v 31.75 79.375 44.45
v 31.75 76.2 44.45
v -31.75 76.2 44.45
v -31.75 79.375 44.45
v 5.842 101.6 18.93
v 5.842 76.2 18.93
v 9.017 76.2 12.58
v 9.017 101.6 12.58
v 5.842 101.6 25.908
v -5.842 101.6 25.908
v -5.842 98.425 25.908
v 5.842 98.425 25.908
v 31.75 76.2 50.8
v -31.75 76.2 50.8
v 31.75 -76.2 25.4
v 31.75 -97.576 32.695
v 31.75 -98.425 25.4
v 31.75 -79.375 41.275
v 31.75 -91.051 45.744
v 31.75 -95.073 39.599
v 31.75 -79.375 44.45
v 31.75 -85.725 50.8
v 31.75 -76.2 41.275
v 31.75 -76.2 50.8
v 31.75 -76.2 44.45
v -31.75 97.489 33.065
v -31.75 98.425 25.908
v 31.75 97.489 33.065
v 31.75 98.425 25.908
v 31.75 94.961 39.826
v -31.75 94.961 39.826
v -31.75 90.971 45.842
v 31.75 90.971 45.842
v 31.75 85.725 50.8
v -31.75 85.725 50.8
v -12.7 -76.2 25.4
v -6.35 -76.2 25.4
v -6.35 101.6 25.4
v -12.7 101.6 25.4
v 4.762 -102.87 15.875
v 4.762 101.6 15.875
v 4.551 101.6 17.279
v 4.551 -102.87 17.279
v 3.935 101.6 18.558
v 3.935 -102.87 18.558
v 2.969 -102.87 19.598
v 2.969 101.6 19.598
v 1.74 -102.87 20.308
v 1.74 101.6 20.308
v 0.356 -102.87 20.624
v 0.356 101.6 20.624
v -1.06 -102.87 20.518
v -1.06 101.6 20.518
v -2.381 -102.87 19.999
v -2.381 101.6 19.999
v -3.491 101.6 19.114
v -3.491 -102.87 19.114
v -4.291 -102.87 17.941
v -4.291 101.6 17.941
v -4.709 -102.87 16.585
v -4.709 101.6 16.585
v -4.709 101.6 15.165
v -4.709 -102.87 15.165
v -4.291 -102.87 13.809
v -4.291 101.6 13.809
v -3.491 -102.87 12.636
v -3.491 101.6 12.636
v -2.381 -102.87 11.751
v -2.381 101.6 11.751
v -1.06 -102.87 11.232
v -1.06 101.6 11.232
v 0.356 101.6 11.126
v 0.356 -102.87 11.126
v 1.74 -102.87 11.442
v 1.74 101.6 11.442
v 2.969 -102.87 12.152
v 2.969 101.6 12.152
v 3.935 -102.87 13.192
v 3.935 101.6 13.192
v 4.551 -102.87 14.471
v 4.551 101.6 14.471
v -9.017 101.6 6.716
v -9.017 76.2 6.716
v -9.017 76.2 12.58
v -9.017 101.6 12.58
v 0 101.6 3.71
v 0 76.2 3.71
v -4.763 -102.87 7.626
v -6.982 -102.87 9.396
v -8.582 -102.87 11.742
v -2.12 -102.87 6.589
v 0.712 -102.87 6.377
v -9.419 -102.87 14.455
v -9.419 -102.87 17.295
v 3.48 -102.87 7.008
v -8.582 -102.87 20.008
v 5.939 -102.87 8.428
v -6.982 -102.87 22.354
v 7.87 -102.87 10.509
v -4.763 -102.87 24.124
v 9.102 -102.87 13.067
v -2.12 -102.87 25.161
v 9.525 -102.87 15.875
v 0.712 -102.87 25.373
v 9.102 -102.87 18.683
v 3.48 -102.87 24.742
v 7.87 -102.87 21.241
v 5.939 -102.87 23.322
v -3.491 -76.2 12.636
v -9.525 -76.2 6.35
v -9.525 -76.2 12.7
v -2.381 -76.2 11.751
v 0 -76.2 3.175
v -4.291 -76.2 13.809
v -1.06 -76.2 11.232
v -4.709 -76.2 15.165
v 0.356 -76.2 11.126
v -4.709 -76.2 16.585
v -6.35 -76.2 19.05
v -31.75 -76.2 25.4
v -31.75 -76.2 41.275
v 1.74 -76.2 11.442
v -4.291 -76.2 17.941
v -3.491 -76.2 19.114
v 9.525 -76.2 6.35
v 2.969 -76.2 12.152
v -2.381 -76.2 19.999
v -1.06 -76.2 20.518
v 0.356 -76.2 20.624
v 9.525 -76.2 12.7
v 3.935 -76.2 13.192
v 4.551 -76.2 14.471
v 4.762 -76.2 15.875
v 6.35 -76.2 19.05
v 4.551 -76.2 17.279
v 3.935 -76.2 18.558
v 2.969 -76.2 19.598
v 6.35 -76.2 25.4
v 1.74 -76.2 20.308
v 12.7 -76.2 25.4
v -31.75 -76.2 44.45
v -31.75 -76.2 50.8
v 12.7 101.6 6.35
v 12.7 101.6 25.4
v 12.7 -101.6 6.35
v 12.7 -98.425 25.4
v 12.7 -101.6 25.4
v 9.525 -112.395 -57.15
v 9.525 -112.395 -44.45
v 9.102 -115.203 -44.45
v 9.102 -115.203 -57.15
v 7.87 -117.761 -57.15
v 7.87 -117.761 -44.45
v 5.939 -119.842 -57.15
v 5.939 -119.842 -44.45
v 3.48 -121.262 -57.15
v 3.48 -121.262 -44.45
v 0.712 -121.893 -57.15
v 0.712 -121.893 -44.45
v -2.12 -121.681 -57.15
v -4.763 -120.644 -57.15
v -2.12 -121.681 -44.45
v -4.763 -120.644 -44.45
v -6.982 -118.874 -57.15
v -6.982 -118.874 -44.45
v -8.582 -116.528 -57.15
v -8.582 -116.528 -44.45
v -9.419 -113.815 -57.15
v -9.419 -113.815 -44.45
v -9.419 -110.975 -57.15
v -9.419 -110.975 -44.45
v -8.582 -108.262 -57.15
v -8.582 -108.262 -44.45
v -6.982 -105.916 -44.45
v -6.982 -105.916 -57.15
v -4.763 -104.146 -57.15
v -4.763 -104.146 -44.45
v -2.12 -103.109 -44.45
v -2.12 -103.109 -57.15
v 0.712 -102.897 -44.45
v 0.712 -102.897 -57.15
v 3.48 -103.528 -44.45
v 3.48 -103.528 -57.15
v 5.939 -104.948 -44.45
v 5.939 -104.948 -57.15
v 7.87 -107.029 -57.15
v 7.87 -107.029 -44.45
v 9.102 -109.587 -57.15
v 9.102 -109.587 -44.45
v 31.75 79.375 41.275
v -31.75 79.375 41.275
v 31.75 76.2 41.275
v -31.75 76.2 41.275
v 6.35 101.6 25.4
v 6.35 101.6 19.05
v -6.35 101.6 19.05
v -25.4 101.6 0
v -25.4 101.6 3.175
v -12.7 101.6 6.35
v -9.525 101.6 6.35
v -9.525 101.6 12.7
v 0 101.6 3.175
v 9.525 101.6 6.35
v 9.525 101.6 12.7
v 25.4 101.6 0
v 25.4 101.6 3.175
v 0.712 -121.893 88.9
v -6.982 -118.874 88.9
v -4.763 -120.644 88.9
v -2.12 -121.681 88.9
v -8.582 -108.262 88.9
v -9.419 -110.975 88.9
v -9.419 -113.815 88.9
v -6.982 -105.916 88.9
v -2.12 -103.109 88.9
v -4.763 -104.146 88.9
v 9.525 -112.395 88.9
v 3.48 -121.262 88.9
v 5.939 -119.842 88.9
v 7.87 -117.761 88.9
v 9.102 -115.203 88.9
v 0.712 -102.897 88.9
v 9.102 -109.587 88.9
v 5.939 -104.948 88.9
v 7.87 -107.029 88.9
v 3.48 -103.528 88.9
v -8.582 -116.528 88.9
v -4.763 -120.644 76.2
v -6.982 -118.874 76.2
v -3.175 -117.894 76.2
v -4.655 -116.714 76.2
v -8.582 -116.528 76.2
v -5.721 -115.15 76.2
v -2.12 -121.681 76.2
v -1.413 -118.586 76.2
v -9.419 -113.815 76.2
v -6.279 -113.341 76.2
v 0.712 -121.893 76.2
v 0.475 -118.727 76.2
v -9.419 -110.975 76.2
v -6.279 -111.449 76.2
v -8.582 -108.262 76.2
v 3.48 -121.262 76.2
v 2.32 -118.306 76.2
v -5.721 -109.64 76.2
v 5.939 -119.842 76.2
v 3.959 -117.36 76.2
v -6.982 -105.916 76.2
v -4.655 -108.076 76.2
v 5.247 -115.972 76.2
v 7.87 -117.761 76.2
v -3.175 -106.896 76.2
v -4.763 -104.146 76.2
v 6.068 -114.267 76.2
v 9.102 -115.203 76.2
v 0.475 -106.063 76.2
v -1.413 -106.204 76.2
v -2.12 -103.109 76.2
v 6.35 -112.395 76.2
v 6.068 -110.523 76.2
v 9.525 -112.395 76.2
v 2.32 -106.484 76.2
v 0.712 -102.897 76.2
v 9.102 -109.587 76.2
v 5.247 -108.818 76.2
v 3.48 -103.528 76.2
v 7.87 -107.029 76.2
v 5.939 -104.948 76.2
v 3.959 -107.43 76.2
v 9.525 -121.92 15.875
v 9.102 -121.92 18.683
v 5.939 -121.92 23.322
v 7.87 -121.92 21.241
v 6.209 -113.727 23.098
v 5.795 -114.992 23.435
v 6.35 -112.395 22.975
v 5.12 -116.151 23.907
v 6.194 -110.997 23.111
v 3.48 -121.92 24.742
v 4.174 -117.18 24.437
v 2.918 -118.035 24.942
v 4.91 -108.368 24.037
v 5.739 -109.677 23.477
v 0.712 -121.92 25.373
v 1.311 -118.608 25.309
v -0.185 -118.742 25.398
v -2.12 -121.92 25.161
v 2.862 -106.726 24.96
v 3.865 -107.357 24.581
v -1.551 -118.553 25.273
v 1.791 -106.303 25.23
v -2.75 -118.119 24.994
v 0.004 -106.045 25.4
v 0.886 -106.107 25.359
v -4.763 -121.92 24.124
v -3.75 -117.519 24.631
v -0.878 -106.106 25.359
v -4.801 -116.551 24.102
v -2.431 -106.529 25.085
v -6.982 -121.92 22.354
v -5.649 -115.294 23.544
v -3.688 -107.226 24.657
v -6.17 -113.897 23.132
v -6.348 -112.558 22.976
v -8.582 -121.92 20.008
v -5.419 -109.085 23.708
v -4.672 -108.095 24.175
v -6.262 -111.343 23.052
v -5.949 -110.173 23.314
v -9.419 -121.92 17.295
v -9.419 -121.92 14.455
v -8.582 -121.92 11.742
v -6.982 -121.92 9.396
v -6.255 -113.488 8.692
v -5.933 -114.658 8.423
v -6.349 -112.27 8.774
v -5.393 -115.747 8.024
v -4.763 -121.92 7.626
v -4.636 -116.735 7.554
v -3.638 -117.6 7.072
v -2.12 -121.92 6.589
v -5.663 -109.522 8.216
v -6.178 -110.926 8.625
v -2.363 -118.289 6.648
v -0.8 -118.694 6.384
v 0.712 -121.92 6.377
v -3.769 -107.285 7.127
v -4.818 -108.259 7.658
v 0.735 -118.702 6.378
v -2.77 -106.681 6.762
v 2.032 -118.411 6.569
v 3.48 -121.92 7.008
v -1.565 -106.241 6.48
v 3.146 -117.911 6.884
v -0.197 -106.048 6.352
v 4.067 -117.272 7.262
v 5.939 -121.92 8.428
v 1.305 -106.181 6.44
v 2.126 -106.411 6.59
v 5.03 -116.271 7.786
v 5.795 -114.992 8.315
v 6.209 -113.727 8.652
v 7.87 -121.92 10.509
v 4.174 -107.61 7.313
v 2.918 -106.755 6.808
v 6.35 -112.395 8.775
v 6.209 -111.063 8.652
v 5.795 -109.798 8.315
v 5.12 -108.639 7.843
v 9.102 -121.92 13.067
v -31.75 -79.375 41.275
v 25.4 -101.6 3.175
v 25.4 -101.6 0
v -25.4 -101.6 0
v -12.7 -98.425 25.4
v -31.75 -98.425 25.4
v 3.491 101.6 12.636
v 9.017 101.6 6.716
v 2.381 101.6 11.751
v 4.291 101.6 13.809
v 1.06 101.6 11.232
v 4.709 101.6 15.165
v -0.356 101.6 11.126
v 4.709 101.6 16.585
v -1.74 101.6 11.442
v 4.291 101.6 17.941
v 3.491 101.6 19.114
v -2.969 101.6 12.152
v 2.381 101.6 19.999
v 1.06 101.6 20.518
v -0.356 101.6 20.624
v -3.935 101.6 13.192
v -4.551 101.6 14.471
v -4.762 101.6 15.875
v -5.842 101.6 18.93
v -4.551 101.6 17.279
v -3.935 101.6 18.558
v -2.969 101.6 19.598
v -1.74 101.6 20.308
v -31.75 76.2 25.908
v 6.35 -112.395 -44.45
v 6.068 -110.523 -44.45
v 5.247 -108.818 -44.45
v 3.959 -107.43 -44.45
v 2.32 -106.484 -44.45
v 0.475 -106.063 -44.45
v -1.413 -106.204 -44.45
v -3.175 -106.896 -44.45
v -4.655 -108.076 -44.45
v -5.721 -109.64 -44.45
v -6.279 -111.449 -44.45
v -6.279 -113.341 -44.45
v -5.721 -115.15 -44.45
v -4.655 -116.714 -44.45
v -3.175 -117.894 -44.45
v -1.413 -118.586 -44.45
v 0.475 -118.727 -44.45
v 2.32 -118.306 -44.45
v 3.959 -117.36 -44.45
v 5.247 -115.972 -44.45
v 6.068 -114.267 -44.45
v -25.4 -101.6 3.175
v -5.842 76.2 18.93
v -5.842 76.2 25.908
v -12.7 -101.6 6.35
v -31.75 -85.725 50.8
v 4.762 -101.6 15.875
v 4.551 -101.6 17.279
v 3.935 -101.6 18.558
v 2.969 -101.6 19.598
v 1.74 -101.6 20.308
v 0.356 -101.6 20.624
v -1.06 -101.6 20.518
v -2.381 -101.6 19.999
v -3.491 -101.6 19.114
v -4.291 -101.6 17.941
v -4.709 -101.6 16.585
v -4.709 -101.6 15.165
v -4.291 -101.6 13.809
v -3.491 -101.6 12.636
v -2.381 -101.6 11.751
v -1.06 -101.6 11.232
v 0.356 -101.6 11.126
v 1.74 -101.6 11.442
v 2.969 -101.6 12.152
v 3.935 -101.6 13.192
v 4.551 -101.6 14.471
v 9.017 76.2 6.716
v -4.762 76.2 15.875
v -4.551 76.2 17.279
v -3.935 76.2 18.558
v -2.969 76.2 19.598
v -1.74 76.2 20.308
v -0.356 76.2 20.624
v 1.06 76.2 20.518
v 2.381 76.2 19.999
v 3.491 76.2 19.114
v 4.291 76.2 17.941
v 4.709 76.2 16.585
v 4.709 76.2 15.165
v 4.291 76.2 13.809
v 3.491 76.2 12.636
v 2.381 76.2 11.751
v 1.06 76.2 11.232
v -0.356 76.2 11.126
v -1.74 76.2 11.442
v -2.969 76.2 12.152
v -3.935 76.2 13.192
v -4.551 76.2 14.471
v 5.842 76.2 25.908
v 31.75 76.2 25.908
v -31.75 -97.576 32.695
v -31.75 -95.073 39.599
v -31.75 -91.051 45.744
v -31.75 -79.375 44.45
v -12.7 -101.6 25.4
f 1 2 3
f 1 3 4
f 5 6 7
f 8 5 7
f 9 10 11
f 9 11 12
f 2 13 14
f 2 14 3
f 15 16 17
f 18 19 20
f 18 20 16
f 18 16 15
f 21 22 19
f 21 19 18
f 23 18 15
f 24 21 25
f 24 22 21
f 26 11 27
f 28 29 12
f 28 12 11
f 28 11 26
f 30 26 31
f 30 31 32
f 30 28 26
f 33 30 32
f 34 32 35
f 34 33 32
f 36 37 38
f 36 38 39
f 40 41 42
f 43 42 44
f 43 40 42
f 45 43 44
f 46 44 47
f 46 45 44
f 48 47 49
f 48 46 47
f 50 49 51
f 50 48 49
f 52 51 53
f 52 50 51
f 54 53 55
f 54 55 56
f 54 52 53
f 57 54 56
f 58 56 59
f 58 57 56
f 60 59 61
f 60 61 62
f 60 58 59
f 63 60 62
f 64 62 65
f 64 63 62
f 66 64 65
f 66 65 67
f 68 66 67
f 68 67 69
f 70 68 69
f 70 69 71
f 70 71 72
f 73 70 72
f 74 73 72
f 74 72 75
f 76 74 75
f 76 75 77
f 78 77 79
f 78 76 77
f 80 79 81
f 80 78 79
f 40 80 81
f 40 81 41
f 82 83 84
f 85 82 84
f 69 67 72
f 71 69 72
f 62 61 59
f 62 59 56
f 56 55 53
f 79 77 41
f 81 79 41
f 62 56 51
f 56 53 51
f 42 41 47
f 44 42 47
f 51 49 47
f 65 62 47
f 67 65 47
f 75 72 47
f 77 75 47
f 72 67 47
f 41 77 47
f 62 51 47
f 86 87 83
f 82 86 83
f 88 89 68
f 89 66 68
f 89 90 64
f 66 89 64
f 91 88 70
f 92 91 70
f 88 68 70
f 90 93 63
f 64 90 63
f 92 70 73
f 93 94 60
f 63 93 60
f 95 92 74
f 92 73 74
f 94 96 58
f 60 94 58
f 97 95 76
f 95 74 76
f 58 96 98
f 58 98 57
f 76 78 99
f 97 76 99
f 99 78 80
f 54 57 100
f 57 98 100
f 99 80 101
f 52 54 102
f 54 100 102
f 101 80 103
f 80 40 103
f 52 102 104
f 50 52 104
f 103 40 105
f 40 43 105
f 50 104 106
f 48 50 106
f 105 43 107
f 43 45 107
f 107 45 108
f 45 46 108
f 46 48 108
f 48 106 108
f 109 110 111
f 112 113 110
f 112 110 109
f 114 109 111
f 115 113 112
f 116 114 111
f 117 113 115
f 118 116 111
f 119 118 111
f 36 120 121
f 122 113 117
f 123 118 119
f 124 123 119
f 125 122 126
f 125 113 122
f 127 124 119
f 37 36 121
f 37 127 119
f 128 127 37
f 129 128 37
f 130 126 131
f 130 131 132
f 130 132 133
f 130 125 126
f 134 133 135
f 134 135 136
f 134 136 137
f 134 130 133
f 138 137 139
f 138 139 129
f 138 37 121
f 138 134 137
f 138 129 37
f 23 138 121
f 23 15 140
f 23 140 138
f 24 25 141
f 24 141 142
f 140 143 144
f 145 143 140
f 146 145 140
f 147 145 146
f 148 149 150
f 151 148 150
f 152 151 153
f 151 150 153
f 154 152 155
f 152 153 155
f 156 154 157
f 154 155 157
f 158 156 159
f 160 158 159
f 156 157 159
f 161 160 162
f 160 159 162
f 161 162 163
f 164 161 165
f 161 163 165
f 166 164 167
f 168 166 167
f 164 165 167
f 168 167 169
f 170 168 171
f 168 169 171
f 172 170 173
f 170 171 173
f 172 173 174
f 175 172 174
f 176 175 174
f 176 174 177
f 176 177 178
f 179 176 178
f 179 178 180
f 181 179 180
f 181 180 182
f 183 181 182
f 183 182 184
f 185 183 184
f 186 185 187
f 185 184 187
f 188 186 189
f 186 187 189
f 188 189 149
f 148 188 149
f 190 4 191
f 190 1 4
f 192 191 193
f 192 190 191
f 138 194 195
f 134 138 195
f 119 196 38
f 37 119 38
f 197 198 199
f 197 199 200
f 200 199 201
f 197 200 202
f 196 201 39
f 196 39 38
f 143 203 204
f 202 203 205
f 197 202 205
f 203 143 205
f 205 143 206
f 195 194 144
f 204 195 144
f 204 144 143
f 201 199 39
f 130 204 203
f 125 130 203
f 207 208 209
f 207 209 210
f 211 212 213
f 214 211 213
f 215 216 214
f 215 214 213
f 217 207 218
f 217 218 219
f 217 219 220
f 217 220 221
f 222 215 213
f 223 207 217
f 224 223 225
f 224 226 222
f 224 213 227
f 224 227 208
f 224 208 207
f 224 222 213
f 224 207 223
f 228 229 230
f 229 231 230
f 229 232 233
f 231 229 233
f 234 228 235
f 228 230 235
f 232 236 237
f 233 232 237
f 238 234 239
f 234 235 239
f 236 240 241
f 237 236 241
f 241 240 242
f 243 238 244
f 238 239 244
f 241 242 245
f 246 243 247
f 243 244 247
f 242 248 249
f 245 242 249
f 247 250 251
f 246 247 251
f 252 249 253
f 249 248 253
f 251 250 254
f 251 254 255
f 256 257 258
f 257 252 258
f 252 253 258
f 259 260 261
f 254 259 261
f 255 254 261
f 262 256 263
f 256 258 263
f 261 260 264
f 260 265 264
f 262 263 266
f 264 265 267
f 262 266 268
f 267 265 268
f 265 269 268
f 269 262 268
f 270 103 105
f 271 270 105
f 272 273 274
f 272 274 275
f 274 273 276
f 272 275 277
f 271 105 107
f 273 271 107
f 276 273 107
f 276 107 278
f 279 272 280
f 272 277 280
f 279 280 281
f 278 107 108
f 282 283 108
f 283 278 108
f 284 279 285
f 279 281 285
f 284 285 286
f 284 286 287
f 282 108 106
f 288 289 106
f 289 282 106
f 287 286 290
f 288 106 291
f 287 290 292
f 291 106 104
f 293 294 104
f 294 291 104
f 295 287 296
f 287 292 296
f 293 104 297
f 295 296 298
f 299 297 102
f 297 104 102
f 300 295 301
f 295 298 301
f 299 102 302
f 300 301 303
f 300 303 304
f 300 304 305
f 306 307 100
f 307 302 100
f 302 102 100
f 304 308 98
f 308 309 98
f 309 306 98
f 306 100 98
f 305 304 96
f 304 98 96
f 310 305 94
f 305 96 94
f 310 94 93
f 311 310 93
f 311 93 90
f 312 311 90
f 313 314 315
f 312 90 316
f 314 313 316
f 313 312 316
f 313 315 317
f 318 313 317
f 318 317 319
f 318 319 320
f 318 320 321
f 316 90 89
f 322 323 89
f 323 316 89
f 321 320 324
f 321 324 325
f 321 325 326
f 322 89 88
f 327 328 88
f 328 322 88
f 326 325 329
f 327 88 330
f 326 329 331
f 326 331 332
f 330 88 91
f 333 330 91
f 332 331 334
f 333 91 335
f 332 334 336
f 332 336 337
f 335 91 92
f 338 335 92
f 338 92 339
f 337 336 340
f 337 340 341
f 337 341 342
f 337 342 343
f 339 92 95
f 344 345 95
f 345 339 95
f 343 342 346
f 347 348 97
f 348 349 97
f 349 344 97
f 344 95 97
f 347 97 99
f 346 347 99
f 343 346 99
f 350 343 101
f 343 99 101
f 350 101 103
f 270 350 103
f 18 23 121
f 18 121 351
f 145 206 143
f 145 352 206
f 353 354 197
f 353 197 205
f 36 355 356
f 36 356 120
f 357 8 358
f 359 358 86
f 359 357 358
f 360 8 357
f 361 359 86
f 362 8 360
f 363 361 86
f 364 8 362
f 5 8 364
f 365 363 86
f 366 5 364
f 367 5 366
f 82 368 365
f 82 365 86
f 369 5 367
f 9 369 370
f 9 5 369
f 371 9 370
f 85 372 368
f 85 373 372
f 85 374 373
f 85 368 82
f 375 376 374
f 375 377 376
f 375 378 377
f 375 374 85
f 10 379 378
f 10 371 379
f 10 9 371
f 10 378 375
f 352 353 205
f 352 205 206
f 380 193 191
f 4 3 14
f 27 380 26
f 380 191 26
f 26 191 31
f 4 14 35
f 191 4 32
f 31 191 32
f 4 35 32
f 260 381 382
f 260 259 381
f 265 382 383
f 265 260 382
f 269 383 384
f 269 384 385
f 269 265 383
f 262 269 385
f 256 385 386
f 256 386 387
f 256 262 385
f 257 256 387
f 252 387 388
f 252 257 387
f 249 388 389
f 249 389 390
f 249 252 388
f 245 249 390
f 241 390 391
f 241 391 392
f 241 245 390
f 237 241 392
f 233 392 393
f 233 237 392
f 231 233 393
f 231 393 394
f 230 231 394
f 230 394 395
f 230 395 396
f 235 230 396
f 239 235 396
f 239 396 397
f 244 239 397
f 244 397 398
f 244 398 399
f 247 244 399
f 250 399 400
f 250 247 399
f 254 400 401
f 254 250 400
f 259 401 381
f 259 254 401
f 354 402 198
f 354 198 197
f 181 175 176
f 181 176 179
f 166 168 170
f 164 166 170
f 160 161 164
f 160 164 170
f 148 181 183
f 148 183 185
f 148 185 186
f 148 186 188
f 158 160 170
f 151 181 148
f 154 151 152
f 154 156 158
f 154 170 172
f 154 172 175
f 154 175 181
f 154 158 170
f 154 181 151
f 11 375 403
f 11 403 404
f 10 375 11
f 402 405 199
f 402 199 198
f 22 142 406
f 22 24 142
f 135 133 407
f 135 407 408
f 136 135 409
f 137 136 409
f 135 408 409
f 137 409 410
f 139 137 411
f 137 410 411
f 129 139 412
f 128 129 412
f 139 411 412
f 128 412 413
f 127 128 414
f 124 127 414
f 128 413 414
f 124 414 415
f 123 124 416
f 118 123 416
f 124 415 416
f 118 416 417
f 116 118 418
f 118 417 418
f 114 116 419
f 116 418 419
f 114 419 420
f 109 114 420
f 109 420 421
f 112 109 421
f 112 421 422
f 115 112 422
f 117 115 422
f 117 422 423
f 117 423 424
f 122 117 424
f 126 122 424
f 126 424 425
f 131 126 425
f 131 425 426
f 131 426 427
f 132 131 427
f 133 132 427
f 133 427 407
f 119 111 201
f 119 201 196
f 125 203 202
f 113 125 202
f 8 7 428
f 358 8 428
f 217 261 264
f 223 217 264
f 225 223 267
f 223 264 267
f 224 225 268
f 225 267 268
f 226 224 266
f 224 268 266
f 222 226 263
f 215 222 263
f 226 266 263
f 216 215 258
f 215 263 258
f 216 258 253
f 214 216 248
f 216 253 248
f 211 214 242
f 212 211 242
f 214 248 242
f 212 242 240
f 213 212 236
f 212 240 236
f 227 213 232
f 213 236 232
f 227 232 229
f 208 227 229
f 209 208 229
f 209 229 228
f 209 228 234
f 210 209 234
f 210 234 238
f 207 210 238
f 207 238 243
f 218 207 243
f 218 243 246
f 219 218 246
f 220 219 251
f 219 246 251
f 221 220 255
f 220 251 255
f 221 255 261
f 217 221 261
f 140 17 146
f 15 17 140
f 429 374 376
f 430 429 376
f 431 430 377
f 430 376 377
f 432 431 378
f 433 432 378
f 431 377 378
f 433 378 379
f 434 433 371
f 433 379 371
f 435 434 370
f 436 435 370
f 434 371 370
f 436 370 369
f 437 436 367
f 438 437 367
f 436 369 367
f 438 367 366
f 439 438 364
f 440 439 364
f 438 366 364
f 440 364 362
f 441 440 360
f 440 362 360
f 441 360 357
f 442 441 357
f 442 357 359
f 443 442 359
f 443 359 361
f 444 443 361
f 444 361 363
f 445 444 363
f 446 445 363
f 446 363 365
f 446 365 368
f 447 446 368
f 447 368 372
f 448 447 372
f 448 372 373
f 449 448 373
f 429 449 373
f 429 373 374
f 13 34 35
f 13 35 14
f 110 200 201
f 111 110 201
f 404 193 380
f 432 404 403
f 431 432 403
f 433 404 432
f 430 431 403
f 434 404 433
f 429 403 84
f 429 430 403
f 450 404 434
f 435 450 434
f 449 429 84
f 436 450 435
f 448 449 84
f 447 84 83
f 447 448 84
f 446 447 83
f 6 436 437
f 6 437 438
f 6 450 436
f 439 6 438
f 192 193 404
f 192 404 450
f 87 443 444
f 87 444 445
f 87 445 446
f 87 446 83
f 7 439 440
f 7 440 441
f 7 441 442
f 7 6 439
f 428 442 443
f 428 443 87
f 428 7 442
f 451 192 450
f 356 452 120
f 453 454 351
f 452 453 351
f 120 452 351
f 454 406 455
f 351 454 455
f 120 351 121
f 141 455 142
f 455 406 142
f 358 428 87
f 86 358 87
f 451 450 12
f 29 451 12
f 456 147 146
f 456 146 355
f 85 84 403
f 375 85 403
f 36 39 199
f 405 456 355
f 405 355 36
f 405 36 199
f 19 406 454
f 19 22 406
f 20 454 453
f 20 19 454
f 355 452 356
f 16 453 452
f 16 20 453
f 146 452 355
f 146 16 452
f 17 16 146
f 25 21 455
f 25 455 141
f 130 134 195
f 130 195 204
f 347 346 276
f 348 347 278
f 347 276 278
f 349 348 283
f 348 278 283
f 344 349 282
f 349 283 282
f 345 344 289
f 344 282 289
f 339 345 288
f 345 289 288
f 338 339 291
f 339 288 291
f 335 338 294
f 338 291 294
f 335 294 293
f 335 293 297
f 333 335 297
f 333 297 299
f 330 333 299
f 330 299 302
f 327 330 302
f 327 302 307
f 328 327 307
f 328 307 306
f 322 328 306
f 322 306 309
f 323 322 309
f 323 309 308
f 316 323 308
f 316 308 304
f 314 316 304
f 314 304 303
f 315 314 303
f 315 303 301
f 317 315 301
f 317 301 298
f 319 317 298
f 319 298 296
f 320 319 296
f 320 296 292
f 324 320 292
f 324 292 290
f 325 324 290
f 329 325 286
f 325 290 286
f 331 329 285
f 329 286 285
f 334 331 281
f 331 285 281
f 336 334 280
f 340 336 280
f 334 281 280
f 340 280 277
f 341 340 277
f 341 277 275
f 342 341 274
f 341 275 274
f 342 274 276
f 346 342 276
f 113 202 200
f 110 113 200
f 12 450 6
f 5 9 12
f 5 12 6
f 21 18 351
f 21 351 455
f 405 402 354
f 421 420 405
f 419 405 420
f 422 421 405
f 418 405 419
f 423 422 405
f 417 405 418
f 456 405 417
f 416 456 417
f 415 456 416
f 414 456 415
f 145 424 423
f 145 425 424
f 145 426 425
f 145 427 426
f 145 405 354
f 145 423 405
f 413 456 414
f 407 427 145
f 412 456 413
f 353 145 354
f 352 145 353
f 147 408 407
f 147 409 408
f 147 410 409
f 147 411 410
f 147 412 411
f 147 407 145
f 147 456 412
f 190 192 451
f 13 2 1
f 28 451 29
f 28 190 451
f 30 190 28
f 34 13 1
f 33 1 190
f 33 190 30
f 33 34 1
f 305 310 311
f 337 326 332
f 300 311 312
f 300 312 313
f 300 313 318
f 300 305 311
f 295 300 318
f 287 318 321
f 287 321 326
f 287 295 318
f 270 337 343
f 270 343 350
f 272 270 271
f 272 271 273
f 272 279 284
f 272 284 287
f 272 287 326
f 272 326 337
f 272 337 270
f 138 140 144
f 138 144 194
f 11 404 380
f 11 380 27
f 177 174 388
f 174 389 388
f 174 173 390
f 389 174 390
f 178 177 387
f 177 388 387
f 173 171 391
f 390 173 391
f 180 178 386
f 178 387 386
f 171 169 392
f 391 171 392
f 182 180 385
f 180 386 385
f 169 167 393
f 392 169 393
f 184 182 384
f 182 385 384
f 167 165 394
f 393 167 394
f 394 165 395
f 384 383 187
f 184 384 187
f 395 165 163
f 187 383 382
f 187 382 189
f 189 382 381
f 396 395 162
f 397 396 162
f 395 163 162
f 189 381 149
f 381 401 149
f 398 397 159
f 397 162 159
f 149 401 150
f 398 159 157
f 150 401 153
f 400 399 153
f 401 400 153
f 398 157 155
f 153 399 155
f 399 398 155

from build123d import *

# Parameters (mm, degrees)
F1_DEPTH       = 101.6
F2_R           = 4.7625
F3_DEPTH       = 203.2
F4_R           = 4.7625
F5_DEPTH       = 177.8
F7_DEPTH       = 31.75
F9_DEPTH       = 25.4
F11_DEPTH      = 31.75
F12_R          = 4.7625
F13_DEPTH      = 203.201
F15_R          = 4.7625
F16_DEPTH      = 204.47
F17_R          = 9.525
F18_DEPTH      = 19.05
F19_R          = 6.35
F20_DEPTH      = 25.4
F21_DEPTH      = 50.8
F21_DEPTH_BACK = 69.85
F22_R          = 9.525
F22_R_2        = 6.35
F23_DEPTH      = 12.7
F24_R          = 9.525
F24_R_2        = 6.35
F25_DEPTH      = 12.7


with BuildPart() as f1:
    # F0 (on Front) → F1 (new body, symmetric)
    with BuildSketch(Plane.XZ):
        Polygon((12.7, 25.4), (-12.7, 25.4), (-12.7, 6.35), (-25.4, 3.175), (-25.4, 0), (-12.7, 0), (12.7, 0), (25.4, 0), (25.4, 3.175), (12.7, 6.35), align=None)
    extrude(amount=F1_DEPTH, both=True)

    # F2 (on face) → F3 (cut, through all)
    with BuildSketch(Plane.XZ.offset(101.6)):
        with Locations((0, 15.875)):
            Circle(F2_R)
    extrude(amount=-F3_DEPTH, mode=Mode.SUBTRACT)

    # F4 (on face) → F5 (cut)
    with BuildSketch(Plane(origin=(0, 101.6, 0), x_dir=(-1, 0, 0), z_dir=(0, 1, 0))):
        Polygon((6.35, 19.05), (6.35, 25.4), (-6.35, 25.4), (-6.35, 19.05), (-9.525, 12.7), (-9.525, 6.35), (0, 3.175), (9.525, 6.35), (9.525, 12.7), align=None)
        with Locations((0, 15.875)):
            Circle(F4_R, mode=Mode.SUBTRACT)
    extrude(amount=-F5_DEPTH, mode=Mode.SUBTRACT)

    # F6 (on Right) → F7 (join, symmetric)
    with BuildSketch(Plane.YZ):
        with BuildLine():
            Line((-98.425, 25.4), (-76.2, 25.4))
            Line((-76.2, 25.4), (-76.2, 41.275))
            Line((-76.2, 41.275), (-79.375, 41.275))
            Line((-79.375, 41.275), (-79.375, 44.45))
            Line((-79.375, 44.45), (-76.2, 44.45))
            Line((-76.2, 44.45), (-76.2, 50.8))
            Line((-76.2, 50.8), (-85.725, 50.8))
            ThreePointArc((-85.725, 50.8), (-95.0730633142, 39.5990316571), (-98.425, 25.4))
        make_face()
    extrude(amount=F7_DEPTH, both=True)


with BuildPart() as f9:
    # F8 (on face) → F9 (new body)
    with BuildSketch(Plane(origin=(0, 101.6, 0), x_dir=(-1, 0, 0), z_dir=(0, 1, 0))):
        Polygon((-5.8419998417, 25.908), (-5.8419998417, 18.9300774301), (-9.0169998417, 12.5800774301), (-9.0169998417, 6.7161457978), (0, 3.7104791839), (9.0169998417, 6.7161457978), (9.0169998417, 12.5800774301), (5.8419998417, 18.9300774301), (5.8419998417, 25.908), align=None)
    extrude(amount=-F9_DEPTH)

    # F10 (on Right) → F11 (join, symmetric)
    with BuildSketch(Plane.YZ):
        with BuildLine():
            Line((76.2, 41.275), (76.2, 25.908))
            Line((76.2, 25.908), (98.425, 25.908))
            ThreePointArc((98.425, 25.908), (94.9608031366, 39.8263485391), (85.725, 50.8))
            Line((85.725, 50.8), (76.2, 50.8))
            Line((76.2, 50.8), (76.2, 44.45))
            Line((76.2, 44.45), (79.375, 44.45))
            Line((79.375, 44.45), (79.375, 41.275))
            Line((79.375, 41.275), (76.2, 41.275))
        make_face()
    extrude(amount=F11_DEPTH, both=True)

    # F12 (on face) → F13 (cut, through all)
    with BuildSketch(Plane(origin=(0, 101.6, 0), x_dir=(-1, 0, 0), z_dir=(0, 1, 0))):
        with Locations((0, 15.875)):
            Circle(F12_R)
    extrude(amount=-F13_DEPTH, mode=Mode.SUBTRACT)


with BuildPart() as f16:
    # F15 (on offset) → F16 (new body, through all)
    with BuildSketch(Plane.XZ.offset(102.87)):
        with Locations((0, 15.875)):
            Circle(F15_R)
    extrude(amount=-F16_DEPTH)

    # F17 (on offset) → F18 (join)
    with BuildSketch(Plane.XZ.offset(102.87)):
        with Locations((0, 15.875)):
            Circle(F17_R)
    extrude(amount=F18_DEPTH)

    # F19 (on face) → F20 (cut)
    with BuildSketch(Plane.XY.offset(25.4)):
        with Locations((0, -112.395)):
            Circle(F19_R)
    extrude(amount=-F20_DEPTH, mode=Mode.SUBTRACT)


with BuildPart() as f21:
    # F19 (on face) → F21 (new body, two sides)
    with BuildSketch(Plane.XY.offset(25.4)) as f21_sk:
        with Locations((0, -112.395)):
            Circle(F19_R)
    extrude(amount=F21_DEPTH)
    extrude(f21_sk.sketch, amount=-F21_DEPTH_BACK)

    # F22 (on face) → F23 (join)
    with BuildSketch(Plane.XY.offset(76.2)):
        with Locations((0, -112.395)):
            Circle(F22_R)
        with Locations((0, -112.395)):
            Circle(F22_R_2, mode=Mode.SUBTRACT)
        with Locations((0, -112.395)):
            Circle(F22_R_2)
    extrude(amount=F23_DEPTH)

    # F24 (on face) → F25 (join)
    with BuildSketch(Plane(origin=(0, 0, -44.45), x_dir=(1, 0, 0), z_dir=(0, 0, -1))):
        with Locations((0, 112.395)):
            Circle(F24_R)
        with Locations((0, 112.395)):
            Circle(F24_R_2, mode=Mode.SUBTRACT)
        with Locations((0, 112.395)):
            Circle(F24_R_2)
    extrude(amount=F25_DEPTH)


solid = Compound([f1.part, f9.part, f16.part, f21.part])
